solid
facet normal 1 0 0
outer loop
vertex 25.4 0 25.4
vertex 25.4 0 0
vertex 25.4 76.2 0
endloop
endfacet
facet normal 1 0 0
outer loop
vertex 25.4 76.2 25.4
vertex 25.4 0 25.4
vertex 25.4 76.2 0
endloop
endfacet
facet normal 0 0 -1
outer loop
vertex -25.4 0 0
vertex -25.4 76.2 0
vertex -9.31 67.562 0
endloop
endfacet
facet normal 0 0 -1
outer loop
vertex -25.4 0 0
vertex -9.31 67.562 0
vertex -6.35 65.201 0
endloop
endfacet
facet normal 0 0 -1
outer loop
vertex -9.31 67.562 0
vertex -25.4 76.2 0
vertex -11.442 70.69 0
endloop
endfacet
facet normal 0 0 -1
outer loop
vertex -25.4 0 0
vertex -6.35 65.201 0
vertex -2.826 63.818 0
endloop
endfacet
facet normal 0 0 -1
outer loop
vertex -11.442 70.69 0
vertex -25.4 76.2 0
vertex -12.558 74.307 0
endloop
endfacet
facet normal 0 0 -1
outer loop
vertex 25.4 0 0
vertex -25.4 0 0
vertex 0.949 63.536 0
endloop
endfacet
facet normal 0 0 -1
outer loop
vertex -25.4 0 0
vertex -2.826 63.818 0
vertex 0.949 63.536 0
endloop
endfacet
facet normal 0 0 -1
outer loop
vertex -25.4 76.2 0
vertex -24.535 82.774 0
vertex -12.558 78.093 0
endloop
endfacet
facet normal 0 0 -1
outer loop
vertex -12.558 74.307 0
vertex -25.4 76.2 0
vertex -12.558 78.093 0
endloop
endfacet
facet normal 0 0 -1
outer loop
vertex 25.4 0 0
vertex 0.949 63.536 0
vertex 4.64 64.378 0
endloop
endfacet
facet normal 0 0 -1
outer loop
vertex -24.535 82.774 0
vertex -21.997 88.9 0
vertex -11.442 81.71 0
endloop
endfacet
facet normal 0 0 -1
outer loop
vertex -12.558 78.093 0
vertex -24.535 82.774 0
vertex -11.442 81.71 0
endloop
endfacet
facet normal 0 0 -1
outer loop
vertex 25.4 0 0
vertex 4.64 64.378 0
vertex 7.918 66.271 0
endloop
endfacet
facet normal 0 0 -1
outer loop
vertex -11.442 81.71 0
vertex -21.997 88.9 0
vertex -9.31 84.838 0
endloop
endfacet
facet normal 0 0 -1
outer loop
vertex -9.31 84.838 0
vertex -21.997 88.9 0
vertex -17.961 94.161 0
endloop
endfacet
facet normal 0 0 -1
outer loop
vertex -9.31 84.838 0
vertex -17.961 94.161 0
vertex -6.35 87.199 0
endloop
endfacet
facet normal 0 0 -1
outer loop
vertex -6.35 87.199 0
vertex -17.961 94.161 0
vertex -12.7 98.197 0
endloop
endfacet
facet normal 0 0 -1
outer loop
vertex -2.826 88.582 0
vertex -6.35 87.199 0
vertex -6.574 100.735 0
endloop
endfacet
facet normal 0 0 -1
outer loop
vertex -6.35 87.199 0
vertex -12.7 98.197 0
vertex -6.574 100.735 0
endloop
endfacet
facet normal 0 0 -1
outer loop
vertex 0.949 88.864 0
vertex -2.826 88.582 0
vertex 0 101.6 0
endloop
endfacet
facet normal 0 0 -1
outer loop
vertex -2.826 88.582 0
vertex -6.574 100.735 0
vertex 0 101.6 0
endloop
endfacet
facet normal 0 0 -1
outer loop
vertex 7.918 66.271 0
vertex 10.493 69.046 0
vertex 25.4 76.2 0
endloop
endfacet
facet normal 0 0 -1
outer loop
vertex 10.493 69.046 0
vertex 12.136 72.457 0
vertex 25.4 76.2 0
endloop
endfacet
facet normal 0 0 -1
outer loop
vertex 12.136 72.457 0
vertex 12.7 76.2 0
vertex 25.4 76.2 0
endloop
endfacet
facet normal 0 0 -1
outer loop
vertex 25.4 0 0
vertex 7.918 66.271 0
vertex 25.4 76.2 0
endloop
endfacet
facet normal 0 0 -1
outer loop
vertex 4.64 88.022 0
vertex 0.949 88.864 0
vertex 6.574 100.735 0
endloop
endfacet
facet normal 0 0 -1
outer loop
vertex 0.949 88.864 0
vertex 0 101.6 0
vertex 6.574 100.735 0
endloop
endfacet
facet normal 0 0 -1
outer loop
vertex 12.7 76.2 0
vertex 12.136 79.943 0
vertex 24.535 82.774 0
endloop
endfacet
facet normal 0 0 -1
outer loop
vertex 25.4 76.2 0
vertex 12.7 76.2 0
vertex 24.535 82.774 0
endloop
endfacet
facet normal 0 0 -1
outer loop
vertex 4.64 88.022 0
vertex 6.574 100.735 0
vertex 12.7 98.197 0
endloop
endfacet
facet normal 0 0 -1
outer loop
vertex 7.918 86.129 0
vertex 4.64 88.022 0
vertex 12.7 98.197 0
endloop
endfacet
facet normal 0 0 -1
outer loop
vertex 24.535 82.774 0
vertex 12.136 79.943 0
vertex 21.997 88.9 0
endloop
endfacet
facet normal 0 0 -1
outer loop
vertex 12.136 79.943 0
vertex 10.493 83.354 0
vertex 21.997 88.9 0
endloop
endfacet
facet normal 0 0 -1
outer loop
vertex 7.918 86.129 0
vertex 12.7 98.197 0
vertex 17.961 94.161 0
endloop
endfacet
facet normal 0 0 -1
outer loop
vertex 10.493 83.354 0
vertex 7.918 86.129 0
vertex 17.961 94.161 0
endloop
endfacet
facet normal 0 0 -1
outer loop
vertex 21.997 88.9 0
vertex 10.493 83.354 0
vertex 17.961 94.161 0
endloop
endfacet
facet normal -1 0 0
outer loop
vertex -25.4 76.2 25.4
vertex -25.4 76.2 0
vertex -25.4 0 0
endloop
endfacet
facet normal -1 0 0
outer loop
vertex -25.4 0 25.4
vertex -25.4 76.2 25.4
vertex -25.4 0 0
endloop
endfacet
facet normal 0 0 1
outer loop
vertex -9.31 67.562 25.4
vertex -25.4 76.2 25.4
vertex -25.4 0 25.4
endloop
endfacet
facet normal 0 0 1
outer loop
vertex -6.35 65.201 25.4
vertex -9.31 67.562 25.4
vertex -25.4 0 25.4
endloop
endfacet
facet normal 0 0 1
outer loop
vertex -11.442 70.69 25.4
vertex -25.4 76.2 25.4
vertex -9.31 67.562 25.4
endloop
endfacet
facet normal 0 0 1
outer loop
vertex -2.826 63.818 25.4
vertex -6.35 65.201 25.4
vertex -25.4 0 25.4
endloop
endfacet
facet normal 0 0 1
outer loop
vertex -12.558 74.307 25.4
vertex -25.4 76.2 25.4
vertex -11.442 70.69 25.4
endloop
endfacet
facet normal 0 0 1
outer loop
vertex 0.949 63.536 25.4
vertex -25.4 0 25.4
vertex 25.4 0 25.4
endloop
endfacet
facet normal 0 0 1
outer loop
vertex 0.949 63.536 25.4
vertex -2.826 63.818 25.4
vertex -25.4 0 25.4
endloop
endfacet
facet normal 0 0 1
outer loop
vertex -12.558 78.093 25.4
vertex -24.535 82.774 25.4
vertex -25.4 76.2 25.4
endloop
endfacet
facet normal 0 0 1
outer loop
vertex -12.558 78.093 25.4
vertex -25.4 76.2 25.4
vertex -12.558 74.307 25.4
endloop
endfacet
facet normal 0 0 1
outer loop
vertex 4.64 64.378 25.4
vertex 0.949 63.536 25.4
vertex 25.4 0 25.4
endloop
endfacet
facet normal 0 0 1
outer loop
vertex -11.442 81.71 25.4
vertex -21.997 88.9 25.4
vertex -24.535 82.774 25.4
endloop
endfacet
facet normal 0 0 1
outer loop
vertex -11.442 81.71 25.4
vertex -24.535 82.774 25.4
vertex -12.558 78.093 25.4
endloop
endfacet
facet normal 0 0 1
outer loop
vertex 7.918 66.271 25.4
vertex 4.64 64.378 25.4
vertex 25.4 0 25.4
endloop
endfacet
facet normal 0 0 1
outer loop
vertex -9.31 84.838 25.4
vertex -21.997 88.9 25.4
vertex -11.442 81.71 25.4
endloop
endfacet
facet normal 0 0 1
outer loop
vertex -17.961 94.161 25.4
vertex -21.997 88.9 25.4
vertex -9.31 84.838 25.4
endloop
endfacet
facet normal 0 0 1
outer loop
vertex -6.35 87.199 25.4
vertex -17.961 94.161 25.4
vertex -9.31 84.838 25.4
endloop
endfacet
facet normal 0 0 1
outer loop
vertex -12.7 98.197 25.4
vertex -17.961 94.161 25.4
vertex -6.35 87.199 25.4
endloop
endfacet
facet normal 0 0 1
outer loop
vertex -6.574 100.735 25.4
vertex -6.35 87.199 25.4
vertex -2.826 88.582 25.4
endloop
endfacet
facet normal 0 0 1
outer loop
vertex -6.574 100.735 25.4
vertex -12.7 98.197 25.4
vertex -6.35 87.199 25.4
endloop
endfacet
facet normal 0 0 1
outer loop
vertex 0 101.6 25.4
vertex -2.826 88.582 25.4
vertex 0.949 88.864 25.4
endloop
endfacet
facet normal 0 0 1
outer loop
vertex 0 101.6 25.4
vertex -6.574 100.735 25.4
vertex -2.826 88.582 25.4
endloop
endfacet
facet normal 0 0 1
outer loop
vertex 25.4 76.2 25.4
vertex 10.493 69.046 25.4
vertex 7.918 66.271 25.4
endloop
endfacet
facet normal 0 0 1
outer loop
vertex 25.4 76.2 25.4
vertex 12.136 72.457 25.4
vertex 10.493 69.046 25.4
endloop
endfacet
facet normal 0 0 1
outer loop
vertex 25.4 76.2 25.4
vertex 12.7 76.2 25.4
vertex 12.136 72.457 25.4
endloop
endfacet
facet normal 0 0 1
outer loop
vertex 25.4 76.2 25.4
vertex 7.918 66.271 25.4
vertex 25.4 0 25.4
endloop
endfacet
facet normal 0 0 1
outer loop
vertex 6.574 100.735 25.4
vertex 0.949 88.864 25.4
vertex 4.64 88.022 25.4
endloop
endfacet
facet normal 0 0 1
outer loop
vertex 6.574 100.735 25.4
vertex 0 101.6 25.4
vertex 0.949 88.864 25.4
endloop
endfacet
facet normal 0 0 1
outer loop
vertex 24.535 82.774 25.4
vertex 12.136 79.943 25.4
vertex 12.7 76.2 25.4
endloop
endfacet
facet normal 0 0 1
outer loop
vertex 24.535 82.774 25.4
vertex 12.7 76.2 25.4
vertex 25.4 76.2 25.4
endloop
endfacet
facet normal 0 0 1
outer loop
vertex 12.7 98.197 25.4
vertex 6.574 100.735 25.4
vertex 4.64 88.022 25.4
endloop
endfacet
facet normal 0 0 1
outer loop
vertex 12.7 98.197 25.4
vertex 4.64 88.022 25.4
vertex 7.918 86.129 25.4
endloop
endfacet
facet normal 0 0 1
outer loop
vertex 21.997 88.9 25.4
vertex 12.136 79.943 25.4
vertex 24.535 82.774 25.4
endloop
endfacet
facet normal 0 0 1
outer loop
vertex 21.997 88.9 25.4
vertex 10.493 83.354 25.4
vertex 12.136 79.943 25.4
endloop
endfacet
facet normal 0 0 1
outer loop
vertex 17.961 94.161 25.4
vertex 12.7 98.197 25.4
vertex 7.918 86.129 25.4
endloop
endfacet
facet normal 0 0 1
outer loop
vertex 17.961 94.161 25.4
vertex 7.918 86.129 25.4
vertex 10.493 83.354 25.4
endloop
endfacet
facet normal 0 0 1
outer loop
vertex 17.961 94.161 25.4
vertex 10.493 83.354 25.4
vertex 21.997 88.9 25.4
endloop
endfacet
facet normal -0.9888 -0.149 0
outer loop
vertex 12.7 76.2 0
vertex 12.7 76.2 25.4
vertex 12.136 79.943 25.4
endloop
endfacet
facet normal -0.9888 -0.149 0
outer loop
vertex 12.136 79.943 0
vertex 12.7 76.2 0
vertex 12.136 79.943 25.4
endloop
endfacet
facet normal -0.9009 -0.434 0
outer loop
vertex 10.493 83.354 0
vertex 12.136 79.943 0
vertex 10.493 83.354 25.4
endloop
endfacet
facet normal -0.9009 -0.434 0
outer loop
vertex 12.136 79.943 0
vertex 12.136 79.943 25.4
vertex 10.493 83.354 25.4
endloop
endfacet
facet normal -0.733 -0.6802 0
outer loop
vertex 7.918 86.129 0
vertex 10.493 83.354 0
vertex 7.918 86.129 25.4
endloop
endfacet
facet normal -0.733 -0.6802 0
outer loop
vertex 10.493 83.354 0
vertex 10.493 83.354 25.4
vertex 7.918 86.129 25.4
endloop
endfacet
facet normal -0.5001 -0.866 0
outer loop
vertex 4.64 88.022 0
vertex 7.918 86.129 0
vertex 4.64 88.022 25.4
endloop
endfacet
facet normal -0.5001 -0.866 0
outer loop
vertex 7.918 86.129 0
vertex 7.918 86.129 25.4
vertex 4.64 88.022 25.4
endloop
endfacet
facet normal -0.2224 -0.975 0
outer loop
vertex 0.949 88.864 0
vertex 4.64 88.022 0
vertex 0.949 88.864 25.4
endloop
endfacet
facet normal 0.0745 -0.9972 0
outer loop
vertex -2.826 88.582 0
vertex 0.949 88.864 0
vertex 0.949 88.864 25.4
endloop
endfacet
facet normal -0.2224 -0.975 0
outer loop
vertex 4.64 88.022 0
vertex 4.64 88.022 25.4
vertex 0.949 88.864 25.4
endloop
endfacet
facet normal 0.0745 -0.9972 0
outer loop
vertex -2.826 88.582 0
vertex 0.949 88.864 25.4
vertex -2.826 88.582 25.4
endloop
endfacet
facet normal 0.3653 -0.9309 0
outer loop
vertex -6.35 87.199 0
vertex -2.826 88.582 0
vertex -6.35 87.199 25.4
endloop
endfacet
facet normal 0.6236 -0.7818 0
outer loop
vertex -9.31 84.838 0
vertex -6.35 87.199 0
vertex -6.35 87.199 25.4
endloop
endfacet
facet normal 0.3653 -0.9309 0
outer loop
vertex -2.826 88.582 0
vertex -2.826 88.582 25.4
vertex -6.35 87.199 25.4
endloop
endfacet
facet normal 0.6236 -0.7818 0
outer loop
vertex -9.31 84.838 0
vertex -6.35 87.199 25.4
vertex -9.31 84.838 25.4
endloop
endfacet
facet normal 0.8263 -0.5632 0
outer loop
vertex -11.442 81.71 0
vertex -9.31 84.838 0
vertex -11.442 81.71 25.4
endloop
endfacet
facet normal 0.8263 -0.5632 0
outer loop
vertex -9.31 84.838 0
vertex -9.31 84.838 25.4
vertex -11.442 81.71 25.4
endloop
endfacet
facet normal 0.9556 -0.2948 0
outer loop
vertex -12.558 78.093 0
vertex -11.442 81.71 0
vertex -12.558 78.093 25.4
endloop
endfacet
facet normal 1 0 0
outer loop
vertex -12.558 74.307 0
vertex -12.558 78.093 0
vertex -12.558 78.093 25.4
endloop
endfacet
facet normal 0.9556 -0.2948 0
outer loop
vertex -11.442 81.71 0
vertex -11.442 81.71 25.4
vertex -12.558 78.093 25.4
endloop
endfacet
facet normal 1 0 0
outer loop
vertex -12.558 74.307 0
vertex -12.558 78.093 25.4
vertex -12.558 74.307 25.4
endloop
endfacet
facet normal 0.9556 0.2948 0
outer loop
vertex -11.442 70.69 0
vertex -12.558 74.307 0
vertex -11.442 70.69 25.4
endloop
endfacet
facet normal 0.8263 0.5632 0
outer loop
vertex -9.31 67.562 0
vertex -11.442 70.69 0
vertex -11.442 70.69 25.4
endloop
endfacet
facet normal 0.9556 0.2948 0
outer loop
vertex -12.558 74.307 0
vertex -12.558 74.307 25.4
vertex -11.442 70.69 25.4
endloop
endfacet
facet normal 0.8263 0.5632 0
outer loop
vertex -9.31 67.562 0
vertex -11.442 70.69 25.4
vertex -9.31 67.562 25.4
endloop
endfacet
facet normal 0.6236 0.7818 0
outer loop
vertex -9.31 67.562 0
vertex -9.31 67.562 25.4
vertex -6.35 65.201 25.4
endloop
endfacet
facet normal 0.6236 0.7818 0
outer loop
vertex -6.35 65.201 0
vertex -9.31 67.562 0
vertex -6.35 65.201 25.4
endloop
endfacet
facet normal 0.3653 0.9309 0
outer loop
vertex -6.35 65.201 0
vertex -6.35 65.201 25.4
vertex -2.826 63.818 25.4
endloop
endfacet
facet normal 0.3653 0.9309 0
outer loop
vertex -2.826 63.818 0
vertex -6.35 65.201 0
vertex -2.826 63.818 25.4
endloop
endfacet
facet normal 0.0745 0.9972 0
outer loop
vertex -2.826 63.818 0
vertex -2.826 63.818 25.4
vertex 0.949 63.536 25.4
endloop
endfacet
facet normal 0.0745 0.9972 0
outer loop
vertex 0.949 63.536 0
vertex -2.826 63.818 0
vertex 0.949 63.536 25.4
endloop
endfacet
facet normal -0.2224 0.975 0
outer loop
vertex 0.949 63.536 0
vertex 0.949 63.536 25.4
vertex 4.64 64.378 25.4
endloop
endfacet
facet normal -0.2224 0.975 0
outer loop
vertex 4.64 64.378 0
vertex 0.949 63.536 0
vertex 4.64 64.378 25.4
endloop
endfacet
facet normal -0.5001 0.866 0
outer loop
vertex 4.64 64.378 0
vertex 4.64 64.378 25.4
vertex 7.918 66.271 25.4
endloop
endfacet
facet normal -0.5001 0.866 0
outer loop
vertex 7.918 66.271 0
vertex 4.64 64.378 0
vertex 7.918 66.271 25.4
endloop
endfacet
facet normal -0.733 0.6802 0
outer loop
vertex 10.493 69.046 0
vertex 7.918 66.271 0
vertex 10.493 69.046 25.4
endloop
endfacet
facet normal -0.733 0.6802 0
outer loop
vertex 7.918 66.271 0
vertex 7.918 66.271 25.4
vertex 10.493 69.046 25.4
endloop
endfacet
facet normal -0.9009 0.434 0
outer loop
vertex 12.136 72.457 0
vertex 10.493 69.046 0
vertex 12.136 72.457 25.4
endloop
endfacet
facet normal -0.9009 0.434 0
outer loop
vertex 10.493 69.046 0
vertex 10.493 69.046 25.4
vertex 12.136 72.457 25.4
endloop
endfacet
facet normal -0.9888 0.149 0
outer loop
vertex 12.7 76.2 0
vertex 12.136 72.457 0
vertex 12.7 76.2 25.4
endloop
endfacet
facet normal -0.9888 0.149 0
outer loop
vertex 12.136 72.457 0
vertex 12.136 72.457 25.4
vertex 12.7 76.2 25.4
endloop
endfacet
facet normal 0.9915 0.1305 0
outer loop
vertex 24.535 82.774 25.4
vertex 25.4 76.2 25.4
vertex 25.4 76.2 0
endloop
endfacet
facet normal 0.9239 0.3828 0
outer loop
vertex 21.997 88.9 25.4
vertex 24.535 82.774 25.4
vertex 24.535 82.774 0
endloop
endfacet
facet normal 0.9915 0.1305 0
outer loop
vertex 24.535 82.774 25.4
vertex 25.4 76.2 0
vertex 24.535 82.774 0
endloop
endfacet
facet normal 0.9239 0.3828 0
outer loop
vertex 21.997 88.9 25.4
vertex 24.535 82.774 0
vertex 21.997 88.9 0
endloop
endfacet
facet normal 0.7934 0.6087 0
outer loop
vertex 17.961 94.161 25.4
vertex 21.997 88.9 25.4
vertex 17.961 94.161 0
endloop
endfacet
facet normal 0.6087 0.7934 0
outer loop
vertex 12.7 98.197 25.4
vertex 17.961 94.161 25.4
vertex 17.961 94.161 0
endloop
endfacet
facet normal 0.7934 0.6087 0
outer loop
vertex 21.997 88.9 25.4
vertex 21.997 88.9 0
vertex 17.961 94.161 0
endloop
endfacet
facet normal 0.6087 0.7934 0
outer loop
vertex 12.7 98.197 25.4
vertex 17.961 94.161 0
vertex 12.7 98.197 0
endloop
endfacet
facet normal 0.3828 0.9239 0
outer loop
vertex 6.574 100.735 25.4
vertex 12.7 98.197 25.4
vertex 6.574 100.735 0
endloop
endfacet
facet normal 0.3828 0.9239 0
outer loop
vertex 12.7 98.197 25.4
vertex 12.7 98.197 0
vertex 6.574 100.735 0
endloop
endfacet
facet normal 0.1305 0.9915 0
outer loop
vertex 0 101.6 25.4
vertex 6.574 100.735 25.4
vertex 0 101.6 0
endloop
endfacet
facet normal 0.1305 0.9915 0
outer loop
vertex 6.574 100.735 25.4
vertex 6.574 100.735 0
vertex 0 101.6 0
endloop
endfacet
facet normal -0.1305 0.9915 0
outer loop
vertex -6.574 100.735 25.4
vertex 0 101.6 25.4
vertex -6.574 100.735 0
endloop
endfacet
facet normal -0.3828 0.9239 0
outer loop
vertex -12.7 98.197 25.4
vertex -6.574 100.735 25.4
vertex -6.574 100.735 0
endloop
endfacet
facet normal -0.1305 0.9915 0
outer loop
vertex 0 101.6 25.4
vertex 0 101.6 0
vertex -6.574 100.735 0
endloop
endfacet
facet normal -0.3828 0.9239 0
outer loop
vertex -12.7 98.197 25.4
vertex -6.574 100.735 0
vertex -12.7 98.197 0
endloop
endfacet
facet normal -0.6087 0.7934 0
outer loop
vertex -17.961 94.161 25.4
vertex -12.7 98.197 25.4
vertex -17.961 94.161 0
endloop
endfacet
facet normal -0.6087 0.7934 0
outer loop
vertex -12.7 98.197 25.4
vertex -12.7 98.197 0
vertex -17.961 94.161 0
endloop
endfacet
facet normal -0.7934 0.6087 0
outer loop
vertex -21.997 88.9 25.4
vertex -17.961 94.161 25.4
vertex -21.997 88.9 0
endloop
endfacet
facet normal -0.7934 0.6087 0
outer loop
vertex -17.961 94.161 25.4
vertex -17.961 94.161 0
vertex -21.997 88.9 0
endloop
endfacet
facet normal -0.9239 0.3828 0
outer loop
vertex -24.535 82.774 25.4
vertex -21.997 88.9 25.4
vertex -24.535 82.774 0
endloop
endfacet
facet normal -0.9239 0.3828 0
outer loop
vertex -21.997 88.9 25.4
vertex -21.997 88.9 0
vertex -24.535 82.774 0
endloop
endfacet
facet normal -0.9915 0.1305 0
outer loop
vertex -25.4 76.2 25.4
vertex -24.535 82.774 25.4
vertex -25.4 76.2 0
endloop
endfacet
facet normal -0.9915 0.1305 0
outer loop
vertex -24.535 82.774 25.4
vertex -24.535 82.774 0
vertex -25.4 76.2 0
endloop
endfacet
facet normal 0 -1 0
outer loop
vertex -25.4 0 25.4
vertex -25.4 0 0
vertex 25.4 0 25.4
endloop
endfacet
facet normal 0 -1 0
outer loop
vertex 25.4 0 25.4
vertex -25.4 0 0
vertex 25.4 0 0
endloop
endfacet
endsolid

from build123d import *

# Parameters (mm, degrees)
F1_DEPTH = 25.4
F2_R     = 12.7
F3_DEPTH = 25.4


with BuildPart() as f1:
    # F0 (on Top) → F1 (new body)
    with BuildSketch(Plane.XY):
        with BuildLine():
            Line((-25.4, 76.2), (-25.4, 0))
            Line((-25.4, 0), (25.4, 0))
            Line((25.4, 0), (25.4, 76.2))
            ThreePointArc((25.4, 76.2), (0, 50.8), (-25.4, 76.2))
        make_face()
        with BuildLine():
            ThreePointArc((25.4, 76.2), (0, 101.6), (-25.4, 76.2))
            Line((-25.4, 76.2), (25.4, 76.2))
        make_face()
        with BuildLine():
            Line((25.4, 76.2), (-25.4, 76.2))
            ThreePointArc((-25.4, 76.2), (0, 50.8), (25.4, 76.2))
        make_face()
    extrude(amount=F1_DEPTH)

    # F2 (on face) → F3 (cut)
    with BuildSketch(Plane.XY.offset(25.4)):
        with Locations((0, 76.2)):
            Circle(F2_R)
    extrude(amount=-F3_DEPTH, mode=Mode.SUBTRACT)


solid = f1.part
